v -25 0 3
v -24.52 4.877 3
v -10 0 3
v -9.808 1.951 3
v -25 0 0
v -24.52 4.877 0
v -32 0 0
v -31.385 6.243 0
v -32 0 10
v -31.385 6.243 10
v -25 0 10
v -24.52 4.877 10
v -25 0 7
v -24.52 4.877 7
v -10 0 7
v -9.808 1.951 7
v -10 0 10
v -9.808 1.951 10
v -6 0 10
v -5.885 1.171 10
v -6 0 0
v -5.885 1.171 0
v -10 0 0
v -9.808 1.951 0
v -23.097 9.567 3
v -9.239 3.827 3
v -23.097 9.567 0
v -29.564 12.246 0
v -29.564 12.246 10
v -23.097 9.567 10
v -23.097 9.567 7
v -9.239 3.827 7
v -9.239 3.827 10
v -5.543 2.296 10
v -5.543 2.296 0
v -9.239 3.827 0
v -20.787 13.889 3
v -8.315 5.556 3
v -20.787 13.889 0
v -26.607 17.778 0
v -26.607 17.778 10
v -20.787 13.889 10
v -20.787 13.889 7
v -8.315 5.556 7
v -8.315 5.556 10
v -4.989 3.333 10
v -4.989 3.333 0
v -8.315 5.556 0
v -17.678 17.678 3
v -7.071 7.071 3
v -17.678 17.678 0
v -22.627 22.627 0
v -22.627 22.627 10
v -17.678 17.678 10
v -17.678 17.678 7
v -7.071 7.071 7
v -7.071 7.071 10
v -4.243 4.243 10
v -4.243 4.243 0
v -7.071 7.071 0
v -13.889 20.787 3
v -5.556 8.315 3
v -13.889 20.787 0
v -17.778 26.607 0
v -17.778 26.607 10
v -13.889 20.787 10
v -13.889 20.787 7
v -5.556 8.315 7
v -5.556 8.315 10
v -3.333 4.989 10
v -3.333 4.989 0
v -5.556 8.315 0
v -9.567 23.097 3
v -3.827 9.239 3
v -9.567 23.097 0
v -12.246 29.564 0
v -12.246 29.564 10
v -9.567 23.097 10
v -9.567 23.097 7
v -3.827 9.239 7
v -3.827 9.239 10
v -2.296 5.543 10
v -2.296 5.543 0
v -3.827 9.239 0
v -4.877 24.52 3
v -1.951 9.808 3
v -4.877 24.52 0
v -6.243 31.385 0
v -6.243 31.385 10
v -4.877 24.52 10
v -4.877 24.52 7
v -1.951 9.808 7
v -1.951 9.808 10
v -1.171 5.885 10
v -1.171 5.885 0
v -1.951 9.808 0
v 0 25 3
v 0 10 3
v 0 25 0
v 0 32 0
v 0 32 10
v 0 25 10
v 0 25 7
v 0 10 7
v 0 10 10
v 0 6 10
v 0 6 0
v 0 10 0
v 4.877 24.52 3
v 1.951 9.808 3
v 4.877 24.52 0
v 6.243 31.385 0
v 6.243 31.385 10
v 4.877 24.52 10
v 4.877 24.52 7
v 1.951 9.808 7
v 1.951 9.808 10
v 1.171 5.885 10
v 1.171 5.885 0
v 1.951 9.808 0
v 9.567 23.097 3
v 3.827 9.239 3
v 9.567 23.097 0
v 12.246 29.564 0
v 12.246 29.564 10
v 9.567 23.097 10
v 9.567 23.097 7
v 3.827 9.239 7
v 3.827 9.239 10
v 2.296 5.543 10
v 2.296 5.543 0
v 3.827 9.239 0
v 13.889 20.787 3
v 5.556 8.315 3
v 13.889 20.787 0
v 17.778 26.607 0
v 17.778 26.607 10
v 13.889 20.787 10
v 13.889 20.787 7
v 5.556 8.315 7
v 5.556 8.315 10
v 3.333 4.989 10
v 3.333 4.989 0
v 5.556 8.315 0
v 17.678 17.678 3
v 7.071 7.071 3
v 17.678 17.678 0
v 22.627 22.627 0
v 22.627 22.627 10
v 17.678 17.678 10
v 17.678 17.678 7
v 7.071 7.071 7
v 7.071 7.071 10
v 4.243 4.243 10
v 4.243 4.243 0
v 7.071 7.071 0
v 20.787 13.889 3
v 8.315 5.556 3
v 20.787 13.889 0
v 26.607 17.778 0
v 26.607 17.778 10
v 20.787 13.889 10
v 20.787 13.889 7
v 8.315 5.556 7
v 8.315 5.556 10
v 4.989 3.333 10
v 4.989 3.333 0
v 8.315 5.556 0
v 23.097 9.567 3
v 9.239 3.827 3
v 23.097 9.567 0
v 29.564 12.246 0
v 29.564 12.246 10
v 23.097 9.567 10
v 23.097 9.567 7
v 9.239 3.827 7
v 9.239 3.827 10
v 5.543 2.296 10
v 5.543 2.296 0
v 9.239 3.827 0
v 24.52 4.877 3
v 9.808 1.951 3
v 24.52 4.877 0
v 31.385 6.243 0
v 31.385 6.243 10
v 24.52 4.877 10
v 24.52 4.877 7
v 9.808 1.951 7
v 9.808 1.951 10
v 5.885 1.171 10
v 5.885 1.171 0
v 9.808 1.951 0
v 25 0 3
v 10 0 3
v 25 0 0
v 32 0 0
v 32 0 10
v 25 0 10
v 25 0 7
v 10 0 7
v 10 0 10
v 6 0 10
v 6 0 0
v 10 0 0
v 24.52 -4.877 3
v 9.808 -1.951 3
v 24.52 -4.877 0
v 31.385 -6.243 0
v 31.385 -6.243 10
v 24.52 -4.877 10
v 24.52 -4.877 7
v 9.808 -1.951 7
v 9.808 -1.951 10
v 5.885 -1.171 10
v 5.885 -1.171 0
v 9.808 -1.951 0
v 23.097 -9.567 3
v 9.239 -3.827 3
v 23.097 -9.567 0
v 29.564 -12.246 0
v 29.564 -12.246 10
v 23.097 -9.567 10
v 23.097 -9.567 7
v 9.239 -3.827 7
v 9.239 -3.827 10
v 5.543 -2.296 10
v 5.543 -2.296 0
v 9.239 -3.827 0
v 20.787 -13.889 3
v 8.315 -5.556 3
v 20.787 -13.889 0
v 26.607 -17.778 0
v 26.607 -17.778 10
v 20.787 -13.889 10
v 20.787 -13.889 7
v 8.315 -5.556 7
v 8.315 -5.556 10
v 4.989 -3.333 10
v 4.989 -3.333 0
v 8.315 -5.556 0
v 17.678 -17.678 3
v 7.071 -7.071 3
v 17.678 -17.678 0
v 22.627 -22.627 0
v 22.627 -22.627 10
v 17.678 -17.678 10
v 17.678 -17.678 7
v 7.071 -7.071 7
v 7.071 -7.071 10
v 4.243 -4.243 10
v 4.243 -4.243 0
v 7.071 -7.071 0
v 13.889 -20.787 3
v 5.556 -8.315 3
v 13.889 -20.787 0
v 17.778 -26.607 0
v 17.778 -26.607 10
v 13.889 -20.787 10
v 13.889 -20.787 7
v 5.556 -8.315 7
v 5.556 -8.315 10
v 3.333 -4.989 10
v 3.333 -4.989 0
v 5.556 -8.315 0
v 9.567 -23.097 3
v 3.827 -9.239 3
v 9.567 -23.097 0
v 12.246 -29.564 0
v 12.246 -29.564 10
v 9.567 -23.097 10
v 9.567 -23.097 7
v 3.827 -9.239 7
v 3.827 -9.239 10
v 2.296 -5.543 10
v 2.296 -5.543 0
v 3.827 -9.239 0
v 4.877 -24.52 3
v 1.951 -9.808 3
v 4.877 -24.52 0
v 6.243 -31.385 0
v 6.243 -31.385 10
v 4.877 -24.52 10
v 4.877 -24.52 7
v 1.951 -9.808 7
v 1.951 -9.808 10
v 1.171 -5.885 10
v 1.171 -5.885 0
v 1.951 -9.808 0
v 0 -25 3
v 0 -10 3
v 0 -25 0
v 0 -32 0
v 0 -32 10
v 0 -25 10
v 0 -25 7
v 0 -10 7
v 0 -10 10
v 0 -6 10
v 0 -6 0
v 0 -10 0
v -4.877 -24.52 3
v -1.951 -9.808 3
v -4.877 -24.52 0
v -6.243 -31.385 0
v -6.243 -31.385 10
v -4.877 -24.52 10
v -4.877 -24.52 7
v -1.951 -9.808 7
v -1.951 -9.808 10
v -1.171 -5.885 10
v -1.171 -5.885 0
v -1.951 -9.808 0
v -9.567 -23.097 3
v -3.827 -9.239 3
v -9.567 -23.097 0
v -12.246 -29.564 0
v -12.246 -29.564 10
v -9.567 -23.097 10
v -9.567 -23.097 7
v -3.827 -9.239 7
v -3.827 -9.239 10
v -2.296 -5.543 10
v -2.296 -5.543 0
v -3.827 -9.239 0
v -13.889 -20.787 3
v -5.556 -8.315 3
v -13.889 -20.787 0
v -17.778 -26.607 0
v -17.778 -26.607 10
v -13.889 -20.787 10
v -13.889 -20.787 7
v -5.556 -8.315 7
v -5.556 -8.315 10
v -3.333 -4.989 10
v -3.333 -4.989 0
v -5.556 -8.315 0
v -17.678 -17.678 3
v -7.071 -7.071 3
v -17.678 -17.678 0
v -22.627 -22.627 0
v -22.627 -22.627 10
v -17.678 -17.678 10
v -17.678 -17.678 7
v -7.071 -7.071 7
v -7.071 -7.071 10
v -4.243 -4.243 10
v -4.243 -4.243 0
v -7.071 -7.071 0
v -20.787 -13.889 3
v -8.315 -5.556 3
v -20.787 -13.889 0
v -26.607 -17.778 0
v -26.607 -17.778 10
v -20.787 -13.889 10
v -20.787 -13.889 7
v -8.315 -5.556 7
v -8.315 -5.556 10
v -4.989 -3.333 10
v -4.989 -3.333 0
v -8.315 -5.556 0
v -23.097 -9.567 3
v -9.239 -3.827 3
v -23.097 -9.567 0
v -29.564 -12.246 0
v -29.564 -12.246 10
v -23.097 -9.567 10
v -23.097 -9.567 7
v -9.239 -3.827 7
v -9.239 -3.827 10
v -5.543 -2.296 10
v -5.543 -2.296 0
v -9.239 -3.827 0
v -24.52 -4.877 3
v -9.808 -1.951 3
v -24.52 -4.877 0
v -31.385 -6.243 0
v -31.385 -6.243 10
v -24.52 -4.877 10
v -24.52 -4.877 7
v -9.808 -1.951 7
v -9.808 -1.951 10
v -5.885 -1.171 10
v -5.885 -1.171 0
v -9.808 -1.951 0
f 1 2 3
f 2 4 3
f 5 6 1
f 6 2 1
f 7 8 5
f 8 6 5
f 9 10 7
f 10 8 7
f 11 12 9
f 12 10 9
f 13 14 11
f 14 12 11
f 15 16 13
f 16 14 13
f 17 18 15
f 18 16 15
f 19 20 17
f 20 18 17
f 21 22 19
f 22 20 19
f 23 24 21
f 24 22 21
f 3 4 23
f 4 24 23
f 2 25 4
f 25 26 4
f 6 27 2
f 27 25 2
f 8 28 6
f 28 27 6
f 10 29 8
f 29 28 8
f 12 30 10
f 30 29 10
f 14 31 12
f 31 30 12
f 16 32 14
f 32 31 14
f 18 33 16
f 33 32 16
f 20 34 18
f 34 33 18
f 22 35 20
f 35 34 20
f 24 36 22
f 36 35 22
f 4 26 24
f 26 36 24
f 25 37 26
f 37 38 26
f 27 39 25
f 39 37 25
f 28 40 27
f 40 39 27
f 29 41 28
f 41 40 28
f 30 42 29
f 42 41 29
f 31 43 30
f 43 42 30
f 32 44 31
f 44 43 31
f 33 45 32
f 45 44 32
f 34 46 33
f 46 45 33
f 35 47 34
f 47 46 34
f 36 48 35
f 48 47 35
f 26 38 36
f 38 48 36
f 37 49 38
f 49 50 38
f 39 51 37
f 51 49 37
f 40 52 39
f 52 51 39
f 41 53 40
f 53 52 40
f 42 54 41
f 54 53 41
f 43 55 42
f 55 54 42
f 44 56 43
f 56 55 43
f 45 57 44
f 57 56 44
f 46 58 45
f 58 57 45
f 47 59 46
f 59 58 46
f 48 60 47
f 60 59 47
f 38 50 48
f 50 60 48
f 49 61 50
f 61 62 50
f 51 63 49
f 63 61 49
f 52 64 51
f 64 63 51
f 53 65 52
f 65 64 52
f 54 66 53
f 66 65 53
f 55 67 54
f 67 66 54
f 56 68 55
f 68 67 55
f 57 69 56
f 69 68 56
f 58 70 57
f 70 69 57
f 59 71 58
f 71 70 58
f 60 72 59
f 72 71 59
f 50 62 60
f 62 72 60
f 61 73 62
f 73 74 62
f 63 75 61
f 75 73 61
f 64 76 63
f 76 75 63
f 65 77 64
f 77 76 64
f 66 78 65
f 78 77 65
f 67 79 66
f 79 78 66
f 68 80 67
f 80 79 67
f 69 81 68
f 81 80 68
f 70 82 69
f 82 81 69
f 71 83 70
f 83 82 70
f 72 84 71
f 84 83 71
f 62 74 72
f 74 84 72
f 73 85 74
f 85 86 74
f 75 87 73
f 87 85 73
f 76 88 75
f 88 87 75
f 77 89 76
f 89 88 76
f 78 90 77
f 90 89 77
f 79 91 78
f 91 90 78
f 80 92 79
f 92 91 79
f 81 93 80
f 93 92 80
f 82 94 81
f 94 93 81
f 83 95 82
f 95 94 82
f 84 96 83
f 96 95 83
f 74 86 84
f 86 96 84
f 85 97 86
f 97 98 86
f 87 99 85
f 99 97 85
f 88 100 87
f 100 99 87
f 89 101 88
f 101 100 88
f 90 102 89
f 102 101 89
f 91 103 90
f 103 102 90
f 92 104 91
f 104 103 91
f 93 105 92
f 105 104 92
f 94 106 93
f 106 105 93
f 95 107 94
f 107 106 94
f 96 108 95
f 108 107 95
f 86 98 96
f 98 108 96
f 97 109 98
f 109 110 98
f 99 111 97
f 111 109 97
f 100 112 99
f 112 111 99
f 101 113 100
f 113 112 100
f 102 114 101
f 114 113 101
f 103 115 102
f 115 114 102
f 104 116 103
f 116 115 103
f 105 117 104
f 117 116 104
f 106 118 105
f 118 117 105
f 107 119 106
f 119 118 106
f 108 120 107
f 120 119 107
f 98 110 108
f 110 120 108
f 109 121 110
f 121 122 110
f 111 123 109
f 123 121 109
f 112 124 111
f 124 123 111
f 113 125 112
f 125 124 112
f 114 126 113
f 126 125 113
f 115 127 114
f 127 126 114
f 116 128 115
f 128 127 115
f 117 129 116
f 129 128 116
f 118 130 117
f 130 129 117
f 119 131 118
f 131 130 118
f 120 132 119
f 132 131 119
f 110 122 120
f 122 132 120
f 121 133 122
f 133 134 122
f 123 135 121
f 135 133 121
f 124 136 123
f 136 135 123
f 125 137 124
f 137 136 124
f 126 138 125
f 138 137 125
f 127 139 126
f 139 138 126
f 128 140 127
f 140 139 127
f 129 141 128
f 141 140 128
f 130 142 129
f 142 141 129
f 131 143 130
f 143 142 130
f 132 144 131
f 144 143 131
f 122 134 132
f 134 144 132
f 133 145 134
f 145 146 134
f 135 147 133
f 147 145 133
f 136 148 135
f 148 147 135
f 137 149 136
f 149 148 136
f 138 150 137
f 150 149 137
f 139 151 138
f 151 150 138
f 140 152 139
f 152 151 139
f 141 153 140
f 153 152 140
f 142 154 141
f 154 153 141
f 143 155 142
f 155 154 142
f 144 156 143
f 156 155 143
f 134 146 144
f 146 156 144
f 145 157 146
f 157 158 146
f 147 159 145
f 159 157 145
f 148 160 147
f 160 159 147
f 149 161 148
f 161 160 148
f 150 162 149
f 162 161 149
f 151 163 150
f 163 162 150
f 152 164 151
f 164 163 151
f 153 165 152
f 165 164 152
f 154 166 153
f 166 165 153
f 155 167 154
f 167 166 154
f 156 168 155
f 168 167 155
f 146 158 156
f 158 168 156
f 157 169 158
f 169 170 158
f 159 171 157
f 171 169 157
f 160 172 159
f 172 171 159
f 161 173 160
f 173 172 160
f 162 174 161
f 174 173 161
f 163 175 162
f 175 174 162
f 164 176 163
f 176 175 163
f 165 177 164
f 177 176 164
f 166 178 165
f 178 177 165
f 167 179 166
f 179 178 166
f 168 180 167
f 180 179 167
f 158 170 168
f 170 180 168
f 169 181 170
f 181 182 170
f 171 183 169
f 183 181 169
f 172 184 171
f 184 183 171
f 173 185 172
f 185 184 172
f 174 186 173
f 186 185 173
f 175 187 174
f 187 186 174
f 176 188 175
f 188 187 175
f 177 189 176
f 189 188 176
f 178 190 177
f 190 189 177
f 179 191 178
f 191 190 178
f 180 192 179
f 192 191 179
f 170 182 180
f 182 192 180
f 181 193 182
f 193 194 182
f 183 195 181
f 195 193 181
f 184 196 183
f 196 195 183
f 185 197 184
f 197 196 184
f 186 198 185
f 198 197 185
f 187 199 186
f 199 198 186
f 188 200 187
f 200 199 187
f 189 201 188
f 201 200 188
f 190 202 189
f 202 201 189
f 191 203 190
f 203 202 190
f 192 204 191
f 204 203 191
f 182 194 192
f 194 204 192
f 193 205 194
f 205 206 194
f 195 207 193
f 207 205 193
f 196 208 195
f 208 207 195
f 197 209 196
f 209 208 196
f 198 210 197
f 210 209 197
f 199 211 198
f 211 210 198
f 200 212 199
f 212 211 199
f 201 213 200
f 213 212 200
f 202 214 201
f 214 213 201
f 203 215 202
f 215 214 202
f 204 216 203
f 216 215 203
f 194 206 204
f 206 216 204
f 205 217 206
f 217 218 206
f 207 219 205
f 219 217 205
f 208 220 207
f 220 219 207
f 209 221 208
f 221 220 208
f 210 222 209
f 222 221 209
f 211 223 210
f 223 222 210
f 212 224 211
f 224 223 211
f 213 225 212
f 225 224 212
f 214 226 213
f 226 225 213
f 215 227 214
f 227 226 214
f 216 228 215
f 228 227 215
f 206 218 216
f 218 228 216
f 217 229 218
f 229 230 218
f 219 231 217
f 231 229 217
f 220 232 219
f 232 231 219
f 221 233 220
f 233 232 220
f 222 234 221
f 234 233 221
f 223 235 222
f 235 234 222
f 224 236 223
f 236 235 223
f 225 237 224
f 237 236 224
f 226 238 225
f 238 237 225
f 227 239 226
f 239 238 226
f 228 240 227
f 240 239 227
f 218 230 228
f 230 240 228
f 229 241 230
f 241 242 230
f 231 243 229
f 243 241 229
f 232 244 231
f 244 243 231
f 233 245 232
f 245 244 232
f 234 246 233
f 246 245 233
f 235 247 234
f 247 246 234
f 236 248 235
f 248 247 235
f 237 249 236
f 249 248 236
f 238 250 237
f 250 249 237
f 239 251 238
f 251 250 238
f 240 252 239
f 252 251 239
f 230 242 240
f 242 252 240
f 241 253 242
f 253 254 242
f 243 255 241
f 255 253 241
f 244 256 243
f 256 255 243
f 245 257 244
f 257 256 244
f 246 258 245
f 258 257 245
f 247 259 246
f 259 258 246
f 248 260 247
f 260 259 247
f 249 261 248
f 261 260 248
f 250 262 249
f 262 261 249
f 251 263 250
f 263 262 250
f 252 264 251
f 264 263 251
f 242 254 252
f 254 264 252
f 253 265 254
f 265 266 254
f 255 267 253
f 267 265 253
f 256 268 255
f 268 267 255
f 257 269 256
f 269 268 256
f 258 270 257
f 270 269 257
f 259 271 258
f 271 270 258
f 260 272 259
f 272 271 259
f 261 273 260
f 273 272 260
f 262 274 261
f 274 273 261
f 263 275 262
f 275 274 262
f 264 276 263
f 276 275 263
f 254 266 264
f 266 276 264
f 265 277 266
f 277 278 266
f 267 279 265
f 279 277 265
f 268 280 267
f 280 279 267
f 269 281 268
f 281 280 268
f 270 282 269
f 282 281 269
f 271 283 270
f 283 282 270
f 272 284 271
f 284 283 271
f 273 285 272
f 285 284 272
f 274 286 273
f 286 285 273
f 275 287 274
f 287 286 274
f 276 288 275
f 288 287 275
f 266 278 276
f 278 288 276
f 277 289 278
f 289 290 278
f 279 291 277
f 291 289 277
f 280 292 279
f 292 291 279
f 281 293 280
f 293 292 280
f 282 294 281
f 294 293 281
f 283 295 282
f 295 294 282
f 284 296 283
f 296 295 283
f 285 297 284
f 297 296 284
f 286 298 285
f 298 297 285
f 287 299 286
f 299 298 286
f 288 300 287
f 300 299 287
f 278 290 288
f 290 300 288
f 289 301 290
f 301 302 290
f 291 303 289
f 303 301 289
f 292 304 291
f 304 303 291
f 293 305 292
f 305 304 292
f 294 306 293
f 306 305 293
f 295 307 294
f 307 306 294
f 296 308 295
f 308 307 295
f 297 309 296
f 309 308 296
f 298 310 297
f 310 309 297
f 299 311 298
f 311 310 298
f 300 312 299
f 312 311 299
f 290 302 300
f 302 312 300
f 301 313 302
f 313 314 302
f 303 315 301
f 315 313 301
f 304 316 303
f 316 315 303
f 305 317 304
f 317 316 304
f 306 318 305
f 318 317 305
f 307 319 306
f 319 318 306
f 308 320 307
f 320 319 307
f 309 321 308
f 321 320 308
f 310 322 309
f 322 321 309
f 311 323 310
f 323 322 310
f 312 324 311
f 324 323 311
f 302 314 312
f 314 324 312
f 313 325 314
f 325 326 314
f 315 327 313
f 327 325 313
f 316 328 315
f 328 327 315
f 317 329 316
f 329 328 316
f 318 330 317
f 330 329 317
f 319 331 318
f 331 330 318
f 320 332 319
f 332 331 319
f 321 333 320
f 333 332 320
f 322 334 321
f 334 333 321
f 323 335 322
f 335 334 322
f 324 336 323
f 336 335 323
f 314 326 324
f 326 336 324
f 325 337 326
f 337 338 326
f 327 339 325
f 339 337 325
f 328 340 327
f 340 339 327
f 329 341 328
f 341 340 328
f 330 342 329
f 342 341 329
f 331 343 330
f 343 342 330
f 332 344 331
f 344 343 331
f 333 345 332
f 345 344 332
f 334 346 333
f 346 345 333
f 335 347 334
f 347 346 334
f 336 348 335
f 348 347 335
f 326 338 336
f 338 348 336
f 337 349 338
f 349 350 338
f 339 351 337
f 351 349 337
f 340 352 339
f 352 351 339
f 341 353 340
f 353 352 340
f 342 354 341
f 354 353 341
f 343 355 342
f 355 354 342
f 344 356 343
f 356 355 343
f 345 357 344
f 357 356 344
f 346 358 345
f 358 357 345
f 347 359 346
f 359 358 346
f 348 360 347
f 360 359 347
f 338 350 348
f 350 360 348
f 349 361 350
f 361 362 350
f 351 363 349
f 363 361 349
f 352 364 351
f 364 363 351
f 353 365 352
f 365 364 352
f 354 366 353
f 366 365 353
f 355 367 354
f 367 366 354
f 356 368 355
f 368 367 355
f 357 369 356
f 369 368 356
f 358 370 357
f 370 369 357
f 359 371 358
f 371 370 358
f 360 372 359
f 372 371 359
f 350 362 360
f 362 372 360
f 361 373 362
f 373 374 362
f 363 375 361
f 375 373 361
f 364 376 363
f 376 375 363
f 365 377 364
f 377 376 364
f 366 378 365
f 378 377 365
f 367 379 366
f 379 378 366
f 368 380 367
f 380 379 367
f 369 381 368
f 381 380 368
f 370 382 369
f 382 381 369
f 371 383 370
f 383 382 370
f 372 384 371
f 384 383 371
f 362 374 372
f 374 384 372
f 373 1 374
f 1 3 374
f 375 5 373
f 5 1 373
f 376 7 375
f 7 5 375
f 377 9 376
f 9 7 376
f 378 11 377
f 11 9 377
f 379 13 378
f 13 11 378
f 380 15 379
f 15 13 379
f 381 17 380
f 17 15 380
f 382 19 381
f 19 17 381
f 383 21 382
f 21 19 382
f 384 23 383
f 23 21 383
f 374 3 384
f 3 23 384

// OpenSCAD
$fn = 32;

// ----------------------------------------------------------------------
// Revolved part: handwheel R32
// ----------------------------------------------------------------------

// --- parameters (mm) ---
bore_r = 6;               // bore radius
rim_r = 32;               // rim radius
rim_w = 7;                // rim axial width
rim_t = 10;               // rim diameter height
hub_r = 10;               // hub radius
web_t = 4;                // web thickness
revolve_angle = 360;      // revolve sweep, degrees
fit_tol = 0.02;           // declared fit tolerance (prompt contract)
free_tol = 0.2;           // declared free tolerance (prompt contract)

bore_d = 2 * bore_r;
rim_d = 2 * rim_r;
hub_d = 2 * hub_r;

profile = [[6, 0], [10, 0], [10, 3], [25, 3], [25, 0], [32, 0], [32, 10], [25, 10], [25, 7], [10, 7], [10, 10], [6, 10]];  // primary outline, 12 points, counter clockwise

// --- the one profile operation ---
rotate_extrude(angle = revolve_angle) polygon(points = profile);
